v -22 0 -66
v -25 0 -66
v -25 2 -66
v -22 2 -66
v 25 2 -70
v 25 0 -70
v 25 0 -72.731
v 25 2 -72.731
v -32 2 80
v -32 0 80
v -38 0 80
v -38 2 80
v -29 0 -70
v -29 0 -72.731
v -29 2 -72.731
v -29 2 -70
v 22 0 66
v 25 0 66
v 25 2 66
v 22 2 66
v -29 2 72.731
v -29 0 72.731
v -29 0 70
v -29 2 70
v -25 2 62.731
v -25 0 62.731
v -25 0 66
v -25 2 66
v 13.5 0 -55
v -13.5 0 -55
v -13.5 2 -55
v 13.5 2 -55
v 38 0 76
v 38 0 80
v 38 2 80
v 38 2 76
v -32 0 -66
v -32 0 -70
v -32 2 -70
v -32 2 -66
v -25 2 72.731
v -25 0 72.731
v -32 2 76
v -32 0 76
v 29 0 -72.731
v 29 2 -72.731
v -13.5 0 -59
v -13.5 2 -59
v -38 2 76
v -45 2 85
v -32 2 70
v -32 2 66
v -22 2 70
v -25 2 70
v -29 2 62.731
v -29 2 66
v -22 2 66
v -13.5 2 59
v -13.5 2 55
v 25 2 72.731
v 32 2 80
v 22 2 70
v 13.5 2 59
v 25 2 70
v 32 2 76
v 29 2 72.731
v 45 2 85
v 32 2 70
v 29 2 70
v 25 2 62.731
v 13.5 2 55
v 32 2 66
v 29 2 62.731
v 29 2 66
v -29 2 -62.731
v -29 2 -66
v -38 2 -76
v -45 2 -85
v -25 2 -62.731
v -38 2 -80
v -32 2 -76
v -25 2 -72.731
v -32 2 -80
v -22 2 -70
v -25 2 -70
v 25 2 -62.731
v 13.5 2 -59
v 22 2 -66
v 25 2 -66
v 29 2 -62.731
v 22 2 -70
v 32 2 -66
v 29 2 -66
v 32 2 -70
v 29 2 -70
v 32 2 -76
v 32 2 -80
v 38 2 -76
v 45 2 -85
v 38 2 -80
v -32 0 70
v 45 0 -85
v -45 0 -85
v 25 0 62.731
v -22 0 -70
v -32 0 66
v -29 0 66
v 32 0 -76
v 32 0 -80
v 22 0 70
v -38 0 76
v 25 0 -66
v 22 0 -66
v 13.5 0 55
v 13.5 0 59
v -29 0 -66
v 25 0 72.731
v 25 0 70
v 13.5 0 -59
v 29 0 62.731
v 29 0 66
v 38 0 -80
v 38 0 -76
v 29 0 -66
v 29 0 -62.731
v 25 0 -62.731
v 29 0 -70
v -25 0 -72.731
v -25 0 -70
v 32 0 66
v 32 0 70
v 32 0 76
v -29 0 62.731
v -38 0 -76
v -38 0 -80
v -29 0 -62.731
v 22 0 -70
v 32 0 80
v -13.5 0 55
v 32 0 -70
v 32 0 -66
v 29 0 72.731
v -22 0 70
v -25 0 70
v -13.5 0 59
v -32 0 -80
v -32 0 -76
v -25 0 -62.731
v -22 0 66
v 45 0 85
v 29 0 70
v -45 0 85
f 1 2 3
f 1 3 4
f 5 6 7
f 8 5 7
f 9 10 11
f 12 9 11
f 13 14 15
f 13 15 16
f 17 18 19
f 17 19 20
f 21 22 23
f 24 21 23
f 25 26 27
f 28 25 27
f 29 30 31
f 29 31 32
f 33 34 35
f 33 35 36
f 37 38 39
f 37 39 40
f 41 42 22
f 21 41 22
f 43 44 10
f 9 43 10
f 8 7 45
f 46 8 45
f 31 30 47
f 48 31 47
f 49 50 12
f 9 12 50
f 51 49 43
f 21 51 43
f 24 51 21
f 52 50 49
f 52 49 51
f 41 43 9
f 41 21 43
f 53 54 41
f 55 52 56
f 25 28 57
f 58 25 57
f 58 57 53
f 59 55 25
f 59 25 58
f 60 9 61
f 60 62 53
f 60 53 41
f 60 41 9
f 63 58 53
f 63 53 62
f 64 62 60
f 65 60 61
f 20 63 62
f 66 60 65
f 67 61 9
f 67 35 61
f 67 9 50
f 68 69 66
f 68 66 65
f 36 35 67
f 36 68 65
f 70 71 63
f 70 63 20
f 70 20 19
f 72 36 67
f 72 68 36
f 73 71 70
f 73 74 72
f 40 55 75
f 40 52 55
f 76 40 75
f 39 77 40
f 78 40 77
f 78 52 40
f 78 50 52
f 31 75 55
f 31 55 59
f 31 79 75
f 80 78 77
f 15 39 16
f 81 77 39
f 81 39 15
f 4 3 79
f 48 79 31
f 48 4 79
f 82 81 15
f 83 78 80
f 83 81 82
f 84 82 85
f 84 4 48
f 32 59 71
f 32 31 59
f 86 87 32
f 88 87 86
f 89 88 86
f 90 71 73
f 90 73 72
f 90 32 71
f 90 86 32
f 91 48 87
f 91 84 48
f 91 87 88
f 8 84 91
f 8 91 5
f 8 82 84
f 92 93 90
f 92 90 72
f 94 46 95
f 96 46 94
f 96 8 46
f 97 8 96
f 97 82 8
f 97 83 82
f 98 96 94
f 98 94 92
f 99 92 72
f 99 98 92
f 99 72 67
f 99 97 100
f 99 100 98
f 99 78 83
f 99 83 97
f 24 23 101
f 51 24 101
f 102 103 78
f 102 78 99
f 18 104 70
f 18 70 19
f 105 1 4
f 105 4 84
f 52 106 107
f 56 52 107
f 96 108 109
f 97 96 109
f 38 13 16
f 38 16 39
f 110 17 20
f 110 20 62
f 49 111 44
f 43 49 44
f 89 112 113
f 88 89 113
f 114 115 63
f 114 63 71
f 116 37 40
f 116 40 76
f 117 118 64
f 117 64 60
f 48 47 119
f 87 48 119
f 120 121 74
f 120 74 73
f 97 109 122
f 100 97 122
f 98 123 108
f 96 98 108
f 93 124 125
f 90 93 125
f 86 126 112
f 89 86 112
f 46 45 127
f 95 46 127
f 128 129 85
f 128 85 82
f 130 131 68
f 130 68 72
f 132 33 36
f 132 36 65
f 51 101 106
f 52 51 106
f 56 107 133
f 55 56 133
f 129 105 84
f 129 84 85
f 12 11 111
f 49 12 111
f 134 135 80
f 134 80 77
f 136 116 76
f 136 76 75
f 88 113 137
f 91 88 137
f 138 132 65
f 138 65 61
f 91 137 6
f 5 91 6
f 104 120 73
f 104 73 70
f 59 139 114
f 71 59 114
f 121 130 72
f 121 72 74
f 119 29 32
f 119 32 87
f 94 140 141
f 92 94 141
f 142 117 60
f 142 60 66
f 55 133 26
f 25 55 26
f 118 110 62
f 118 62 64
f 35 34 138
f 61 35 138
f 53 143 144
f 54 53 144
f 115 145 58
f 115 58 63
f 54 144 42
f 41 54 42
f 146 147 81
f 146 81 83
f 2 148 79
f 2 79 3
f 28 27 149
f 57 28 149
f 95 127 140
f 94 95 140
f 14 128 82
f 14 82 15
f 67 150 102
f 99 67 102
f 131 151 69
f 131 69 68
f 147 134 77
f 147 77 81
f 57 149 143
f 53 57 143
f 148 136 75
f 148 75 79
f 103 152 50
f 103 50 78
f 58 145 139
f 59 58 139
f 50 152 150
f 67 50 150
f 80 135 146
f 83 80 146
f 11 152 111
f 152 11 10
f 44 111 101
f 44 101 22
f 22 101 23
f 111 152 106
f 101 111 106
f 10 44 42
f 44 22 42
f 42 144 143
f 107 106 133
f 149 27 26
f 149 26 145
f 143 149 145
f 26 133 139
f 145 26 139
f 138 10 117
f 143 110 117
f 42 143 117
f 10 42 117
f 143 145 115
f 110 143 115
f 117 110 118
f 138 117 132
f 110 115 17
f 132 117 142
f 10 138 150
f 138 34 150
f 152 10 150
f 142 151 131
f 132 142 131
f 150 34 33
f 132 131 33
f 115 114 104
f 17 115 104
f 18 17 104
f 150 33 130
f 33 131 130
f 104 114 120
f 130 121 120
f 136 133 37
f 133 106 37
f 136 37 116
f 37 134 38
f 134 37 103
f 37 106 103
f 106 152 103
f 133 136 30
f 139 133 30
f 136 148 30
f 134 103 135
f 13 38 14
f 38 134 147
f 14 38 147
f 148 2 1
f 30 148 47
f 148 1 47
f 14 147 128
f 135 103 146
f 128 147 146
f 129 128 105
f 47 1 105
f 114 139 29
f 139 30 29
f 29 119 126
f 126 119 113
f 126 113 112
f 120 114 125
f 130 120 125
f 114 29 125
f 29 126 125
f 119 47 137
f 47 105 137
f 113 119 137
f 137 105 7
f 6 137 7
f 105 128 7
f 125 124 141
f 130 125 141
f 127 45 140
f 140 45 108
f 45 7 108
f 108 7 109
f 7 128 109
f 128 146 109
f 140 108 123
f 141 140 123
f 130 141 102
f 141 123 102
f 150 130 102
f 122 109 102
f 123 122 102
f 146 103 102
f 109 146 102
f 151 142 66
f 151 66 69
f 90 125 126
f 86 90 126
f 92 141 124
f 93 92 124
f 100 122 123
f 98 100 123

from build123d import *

# Parameters (mm, degrees)
SKETCH_1_W      = 90
SKETCH_1_H      = 170
SKETCH_1_W_2    = 27
SKETCH_1_H_2    = 4
EXTRUDE_1_DEPTH = 2


with BuildPart() as part:
    # 草图1 → 凸台-拉伸1 (new body)
    with BuildSketch(Plane(origin=(0, 0, 0), x_dir=(1, 0, 0), z_dir=(0, 1, 0))):
        Rectangle(SKETCH_1_W, SKETCH_1_H)
        Polygon((-29, -66), (-29, -62.731088435), (-25, -62.731088435), (-25, -66), (-22, -66), (-22, -70), (-25, -70), (-25, -72.731088435), (-29, -72.731088435), (-29, -70), (-32, -70), (-32, -66), align=None, mode=Mode.SUBTRACT)
        Polygon((29, -72.731088435), (29, -70), (32, -70), (32, -66), (29, -66), (29, -62.731088435), (25, -62.731088435), (25, -66), (22, -66), (22, -70), (25, -70), (25, -72.731088435), align=None, mode=Mode.SUBTRACT)
        Polygon((25, 72.731088435), (29, 72.731088435), (29, 70), (32, 70), (32, 66), (29, 66), (29, 62.731088435), (25, 62.731088435), (25, 66), (22, 66), (22, 70), (25, 70), align=None, mode=Mode.SUBTRACT)
        Polygon((-29, 72.731088435), (-29, 70), (-32, 70), (-32, 66), (-29, 66), (-29, 62.731088435), (-25, 62.731088435), (-25, 66), (-22, 66), (-22, 70), (-25, 70), (-25, 72.731088435), align=None, mode=Mode.SUBTRACT)
        Polygon((35, -80), (38, -80), (38, -76), (32, -76), (32, -80), align=None, mode=Mode.SUBTRACT)
        Polygon((-32, -76), (-32, -80), (-35, -80), (-38, -80), (-38, -76), align=None, mode=Mode.SUBTRACT)
        Polygon((32, 76), (32, 80), (35, 80), (38, 80), (38, 76), align=None, mode=Mode.SUBTRACT)
        Polygon((-38, 76), (-32, 76), (-32, 80), (-35, 80), (-38, 80), align=None, mode=Mode.SUBTRACT)
        with Locations((0, 57)):
            Rectangle(SKETCH_1_W_2, SKETCH_1_H_2, mode=Mode.SUBTRACT)
        with Locations((0, -57)):
            Rectangle(SKETCH_1_W_2, SKETCH_1_H_2, mode=Mode.SUBTRACT)
    extrude(amount=EXTRUDE_1_DEPTH)


solid = part.part
